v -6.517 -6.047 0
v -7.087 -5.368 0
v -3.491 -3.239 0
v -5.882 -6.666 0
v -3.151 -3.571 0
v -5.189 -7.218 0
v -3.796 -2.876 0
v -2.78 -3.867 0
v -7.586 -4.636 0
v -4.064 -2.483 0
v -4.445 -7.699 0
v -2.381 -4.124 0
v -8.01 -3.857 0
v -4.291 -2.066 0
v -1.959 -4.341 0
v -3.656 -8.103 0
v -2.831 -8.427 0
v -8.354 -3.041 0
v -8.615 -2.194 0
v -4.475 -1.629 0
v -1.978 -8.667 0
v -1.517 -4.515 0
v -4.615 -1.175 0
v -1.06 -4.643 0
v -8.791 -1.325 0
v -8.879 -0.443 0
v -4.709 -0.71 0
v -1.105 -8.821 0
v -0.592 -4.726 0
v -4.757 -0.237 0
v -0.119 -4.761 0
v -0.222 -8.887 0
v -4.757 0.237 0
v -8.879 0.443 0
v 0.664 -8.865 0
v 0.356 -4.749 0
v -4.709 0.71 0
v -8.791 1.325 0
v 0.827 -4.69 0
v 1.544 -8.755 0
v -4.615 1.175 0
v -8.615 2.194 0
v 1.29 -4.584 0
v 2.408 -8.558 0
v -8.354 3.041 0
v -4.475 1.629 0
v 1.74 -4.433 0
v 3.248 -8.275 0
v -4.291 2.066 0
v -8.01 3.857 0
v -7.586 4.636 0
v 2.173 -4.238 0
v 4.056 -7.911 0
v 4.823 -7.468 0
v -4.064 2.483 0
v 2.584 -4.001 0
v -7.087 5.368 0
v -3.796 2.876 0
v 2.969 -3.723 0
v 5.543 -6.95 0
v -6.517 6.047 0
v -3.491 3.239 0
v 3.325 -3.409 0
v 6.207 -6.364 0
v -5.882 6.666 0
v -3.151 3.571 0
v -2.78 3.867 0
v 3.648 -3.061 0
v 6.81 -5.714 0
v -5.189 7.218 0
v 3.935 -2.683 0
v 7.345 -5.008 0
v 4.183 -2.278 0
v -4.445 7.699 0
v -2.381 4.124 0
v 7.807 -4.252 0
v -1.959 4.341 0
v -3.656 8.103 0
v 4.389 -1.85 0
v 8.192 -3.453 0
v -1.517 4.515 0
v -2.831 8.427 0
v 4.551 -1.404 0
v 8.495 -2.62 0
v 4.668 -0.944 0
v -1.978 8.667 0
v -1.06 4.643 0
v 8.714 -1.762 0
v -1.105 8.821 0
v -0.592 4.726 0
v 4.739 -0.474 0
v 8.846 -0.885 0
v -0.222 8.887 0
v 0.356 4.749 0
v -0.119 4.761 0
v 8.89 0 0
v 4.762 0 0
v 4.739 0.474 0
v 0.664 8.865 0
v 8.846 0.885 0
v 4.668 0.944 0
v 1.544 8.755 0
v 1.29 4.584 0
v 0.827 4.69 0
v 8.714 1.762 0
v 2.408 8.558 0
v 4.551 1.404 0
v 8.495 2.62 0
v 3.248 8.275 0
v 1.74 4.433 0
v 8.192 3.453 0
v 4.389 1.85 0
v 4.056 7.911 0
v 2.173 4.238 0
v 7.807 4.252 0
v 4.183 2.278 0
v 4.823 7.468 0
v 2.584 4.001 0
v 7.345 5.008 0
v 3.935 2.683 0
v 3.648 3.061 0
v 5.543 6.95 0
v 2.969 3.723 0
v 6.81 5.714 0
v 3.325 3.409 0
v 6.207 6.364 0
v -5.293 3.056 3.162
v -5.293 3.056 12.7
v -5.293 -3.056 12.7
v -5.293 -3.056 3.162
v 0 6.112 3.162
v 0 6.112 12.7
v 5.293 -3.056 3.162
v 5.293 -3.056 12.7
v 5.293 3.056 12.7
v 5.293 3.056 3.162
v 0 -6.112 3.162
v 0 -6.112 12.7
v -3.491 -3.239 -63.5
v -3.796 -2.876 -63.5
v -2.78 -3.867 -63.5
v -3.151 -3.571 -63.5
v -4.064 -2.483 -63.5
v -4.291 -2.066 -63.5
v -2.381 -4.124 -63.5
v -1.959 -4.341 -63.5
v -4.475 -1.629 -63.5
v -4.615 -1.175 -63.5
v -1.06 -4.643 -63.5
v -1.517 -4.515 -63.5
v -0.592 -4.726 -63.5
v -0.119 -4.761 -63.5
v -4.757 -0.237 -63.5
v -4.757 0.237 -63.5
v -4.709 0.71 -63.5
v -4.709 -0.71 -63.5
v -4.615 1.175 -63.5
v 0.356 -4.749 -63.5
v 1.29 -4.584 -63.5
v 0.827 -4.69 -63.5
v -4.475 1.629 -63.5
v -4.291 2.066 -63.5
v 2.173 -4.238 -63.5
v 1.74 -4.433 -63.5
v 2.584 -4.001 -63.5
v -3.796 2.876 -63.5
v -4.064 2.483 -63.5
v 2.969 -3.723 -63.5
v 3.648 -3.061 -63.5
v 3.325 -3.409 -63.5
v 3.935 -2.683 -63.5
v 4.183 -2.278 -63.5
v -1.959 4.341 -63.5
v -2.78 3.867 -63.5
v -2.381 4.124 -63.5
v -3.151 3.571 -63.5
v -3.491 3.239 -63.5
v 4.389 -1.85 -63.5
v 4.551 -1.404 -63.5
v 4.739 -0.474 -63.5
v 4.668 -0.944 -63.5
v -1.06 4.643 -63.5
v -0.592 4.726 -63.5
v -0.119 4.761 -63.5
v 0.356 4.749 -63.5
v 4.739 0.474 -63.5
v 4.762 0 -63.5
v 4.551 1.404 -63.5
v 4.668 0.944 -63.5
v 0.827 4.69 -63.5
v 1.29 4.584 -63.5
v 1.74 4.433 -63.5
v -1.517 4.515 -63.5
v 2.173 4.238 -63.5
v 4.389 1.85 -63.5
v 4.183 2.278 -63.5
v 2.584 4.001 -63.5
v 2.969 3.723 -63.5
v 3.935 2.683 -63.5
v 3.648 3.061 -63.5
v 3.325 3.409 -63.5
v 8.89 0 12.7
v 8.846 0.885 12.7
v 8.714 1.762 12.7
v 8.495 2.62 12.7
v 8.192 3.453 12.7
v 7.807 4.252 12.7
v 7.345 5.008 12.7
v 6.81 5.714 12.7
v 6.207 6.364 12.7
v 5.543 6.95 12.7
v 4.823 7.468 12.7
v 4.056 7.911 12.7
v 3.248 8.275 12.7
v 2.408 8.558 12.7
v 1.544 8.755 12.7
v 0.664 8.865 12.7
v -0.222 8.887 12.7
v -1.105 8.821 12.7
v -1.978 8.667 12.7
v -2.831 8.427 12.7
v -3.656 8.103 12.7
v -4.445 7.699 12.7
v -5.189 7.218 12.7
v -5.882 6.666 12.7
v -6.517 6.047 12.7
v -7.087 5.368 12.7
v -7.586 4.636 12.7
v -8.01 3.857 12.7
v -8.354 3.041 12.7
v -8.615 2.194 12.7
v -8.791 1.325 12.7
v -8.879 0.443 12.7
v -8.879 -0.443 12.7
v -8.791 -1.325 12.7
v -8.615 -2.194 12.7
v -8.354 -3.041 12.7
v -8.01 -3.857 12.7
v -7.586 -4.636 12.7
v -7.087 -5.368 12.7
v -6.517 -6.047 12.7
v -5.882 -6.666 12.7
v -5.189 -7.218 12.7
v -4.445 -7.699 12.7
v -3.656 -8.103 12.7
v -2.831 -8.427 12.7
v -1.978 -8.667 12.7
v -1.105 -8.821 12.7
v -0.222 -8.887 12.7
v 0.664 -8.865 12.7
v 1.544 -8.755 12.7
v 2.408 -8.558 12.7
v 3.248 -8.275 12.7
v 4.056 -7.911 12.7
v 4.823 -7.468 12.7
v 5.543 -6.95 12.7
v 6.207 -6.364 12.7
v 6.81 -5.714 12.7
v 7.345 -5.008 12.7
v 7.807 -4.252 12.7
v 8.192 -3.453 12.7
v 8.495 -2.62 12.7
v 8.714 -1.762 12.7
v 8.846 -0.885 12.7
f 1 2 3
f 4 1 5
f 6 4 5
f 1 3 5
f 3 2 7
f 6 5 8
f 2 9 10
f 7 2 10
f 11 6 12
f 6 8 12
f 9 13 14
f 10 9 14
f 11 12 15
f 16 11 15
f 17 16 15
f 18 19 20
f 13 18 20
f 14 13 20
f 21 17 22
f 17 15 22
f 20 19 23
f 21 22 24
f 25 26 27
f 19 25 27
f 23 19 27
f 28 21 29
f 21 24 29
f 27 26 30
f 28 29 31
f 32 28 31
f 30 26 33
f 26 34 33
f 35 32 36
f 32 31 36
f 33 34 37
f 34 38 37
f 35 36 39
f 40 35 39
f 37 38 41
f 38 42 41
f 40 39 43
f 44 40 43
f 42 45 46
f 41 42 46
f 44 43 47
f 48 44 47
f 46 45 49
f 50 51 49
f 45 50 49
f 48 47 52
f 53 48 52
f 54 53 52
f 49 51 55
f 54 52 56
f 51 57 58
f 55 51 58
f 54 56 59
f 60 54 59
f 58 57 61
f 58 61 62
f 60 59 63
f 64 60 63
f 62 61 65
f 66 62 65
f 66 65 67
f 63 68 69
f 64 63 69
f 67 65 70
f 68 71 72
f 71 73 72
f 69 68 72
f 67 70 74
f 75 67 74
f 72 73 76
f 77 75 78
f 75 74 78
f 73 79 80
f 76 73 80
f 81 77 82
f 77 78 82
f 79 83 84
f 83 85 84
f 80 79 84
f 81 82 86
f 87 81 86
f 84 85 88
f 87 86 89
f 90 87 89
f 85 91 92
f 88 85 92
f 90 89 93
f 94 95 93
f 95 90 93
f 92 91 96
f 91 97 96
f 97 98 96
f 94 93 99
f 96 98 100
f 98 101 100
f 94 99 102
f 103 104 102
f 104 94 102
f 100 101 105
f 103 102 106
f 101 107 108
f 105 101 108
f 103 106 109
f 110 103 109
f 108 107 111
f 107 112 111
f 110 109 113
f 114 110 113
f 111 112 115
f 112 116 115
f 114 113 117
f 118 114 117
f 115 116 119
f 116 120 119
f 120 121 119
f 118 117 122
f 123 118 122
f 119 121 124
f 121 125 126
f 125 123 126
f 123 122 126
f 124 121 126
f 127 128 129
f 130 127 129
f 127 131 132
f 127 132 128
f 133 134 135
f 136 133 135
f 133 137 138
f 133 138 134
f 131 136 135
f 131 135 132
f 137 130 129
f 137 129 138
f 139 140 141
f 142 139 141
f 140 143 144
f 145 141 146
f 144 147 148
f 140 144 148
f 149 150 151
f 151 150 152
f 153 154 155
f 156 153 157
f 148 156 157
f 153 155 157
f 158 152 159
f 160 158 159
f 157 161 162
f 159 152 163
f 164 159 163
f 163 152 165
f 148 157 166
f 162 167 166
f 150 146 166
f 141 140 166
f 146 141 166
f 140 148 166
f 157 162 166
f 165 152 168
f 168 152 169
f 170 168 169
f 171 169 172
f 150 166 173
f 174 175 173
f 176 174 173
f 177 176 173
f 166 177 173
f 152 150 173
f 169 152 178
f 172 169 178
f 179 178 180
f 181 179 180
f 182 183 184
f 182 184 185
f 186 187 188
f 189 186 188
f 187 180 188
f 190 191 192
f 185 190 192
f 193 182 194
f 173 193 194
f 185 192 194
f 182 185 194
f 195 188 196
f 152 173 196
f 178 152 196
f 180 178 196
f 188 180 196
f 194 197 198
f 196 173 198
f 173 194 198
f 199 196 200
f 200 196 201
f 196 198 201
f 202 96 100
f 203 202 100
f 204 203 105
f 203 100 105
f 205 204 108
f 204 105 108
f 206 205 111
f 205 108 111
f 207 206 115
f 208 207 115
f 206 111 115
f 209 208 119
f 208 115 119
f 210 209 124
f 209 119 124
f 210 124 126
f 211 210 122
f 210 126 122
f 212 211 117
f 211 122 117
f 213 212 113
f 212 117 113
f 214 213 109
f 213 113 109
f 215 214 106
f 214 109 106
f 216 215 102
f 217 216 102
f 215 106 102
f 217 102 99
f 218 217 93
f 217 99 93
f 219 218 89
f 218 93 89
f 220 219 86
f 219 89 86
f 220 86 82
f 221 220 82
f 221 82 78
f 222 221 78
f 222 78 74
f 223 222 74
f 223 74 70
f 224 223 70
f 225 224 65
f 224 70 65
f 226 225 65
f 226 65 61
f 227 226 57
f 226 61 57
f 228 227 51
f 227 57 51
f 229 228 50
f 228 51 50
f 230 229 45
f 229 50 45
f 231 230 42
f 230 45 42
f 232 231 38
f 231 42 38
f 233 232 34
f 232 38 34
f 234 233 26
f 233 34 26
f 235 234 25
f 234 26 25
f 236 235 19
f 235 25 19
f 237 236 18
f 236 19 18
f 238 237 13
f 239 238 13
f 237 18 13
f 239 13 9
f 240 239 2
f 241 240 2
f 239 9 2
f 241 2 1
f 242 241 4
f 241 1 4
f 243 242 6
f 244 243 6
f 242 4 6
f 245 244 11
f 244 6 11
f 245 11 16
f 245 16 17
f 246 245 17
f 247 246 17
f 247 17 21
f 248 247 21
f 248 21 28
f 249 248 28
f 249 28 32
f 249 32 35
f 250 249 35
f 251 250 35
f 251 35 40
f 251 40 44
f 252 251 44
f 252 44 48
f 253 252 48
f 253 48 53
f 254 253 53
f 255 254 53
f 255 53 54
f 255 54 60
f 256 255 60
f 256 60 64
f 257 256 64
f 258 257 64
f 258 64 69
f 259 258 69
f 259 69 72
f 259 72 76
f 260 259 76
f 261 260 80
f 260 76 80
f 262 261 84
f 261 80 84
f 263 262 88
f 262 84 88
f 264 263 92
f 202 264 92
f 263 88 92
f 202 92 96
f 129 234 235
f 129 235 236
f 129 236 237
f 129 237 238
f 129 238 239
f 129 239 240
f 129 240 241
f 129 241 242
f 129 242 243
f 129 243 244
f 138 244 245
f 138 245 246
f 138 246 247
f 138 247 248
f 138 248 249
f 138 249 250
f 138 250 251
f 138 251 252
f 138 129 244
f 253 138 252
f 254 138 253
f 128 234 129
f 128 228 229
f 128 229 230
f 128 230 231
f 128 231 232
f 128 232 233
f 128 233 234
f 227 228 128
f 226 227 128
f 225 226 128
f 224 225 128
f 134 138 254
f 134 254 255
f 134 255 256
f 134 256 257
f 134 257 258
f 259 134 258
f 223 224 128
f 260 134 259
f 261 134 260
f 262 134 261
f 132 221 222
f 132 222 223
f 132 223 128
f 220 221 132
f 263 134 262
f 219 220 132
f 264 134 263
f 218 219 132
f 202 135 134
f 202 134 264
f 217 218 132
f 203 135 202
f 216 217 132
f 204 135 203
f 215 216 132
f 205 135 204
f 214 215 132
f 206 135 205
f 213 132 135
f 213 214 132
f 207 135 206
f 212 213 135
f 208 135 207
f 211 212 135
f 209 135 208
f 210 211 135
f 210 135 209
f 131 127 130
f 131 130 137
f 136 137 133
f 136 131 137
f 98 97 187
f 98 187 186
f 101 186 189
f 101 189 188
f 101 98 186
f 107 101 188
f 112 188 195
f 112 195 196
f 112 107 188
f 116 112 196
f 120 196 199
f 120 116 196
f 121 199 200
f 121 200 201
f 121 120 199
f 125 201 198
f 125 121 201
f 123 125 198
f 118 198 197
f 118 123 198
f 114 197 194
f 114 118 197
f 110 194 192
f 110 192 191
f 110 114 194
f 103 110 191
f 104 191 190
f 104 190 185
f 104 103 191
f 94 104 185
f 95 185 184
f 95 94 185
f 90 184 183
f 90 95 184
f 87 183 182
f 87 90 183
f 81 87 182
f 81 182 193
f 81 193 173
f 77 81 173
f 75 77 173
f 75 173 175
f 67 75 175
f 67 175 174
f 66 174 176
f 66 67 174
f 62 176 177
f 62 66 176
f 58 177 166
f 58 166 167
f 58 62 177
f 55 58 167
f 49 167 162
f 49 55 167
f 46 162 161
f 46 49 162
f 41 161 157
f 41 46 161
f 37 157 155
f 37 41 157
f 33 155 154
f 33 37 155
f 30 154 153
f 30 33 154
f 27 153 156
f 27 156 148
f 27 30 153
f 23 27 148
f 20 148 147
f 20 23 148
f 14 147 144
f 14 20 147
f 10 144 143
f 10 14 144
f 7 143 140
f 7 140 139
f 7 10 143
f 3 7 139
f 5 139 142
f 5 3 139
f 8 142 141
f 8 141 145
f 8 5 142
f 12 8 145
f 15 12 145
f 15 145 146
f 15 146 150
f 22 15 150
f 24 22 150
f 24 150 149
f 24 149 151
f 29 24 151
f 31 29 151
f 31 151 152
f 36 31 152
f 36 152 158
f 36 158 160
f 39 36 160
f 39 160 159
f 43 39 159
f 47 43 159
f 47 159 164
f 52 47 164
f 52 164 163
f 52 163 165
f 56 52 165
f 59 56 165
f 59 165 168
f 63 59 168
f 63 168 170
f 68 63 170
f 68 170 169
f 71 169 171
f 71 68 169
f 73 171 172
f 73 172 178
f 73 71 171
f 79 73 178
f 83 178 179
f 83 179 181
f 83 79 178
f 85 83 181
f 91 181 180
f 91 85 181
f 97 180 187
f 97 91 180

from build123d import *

# Parameters (mm, degrees)
F0_R     = 4.7625
F1_DEPTH = 63.5
F2_R     = 8.89
F3_DEPTH = 12.7
F5_DEPTH = 9.5377


with BuildPart() as f1:
    # F0 (on Top) → F1 (new body)
    with BuildSketch(Plane.XY):
        Circle(F0_R)
    extrude(amount=-F1_DEPTH)

    # F2 (on Top) → F3 (join)
    with BuildSketch(Plane.XY):
        Circle(F2_R)
    extrude(amount=F3_DEPTH)

    # F4 (on face) → F5 (cut)
    with BuildSketch(Plane.XY.offset(12.7)):
        Polygon((5.293086, -3.055965), (5.293086, 3.055965), (0, 6.111929), (-5.293086, 3.055965), (-5.293086, -3.055965), (0, -6.111929), align=None)
    extrude(amount=-F5_DEPTH, mode=Mode.SUBTRACT)


solid = f1.part
